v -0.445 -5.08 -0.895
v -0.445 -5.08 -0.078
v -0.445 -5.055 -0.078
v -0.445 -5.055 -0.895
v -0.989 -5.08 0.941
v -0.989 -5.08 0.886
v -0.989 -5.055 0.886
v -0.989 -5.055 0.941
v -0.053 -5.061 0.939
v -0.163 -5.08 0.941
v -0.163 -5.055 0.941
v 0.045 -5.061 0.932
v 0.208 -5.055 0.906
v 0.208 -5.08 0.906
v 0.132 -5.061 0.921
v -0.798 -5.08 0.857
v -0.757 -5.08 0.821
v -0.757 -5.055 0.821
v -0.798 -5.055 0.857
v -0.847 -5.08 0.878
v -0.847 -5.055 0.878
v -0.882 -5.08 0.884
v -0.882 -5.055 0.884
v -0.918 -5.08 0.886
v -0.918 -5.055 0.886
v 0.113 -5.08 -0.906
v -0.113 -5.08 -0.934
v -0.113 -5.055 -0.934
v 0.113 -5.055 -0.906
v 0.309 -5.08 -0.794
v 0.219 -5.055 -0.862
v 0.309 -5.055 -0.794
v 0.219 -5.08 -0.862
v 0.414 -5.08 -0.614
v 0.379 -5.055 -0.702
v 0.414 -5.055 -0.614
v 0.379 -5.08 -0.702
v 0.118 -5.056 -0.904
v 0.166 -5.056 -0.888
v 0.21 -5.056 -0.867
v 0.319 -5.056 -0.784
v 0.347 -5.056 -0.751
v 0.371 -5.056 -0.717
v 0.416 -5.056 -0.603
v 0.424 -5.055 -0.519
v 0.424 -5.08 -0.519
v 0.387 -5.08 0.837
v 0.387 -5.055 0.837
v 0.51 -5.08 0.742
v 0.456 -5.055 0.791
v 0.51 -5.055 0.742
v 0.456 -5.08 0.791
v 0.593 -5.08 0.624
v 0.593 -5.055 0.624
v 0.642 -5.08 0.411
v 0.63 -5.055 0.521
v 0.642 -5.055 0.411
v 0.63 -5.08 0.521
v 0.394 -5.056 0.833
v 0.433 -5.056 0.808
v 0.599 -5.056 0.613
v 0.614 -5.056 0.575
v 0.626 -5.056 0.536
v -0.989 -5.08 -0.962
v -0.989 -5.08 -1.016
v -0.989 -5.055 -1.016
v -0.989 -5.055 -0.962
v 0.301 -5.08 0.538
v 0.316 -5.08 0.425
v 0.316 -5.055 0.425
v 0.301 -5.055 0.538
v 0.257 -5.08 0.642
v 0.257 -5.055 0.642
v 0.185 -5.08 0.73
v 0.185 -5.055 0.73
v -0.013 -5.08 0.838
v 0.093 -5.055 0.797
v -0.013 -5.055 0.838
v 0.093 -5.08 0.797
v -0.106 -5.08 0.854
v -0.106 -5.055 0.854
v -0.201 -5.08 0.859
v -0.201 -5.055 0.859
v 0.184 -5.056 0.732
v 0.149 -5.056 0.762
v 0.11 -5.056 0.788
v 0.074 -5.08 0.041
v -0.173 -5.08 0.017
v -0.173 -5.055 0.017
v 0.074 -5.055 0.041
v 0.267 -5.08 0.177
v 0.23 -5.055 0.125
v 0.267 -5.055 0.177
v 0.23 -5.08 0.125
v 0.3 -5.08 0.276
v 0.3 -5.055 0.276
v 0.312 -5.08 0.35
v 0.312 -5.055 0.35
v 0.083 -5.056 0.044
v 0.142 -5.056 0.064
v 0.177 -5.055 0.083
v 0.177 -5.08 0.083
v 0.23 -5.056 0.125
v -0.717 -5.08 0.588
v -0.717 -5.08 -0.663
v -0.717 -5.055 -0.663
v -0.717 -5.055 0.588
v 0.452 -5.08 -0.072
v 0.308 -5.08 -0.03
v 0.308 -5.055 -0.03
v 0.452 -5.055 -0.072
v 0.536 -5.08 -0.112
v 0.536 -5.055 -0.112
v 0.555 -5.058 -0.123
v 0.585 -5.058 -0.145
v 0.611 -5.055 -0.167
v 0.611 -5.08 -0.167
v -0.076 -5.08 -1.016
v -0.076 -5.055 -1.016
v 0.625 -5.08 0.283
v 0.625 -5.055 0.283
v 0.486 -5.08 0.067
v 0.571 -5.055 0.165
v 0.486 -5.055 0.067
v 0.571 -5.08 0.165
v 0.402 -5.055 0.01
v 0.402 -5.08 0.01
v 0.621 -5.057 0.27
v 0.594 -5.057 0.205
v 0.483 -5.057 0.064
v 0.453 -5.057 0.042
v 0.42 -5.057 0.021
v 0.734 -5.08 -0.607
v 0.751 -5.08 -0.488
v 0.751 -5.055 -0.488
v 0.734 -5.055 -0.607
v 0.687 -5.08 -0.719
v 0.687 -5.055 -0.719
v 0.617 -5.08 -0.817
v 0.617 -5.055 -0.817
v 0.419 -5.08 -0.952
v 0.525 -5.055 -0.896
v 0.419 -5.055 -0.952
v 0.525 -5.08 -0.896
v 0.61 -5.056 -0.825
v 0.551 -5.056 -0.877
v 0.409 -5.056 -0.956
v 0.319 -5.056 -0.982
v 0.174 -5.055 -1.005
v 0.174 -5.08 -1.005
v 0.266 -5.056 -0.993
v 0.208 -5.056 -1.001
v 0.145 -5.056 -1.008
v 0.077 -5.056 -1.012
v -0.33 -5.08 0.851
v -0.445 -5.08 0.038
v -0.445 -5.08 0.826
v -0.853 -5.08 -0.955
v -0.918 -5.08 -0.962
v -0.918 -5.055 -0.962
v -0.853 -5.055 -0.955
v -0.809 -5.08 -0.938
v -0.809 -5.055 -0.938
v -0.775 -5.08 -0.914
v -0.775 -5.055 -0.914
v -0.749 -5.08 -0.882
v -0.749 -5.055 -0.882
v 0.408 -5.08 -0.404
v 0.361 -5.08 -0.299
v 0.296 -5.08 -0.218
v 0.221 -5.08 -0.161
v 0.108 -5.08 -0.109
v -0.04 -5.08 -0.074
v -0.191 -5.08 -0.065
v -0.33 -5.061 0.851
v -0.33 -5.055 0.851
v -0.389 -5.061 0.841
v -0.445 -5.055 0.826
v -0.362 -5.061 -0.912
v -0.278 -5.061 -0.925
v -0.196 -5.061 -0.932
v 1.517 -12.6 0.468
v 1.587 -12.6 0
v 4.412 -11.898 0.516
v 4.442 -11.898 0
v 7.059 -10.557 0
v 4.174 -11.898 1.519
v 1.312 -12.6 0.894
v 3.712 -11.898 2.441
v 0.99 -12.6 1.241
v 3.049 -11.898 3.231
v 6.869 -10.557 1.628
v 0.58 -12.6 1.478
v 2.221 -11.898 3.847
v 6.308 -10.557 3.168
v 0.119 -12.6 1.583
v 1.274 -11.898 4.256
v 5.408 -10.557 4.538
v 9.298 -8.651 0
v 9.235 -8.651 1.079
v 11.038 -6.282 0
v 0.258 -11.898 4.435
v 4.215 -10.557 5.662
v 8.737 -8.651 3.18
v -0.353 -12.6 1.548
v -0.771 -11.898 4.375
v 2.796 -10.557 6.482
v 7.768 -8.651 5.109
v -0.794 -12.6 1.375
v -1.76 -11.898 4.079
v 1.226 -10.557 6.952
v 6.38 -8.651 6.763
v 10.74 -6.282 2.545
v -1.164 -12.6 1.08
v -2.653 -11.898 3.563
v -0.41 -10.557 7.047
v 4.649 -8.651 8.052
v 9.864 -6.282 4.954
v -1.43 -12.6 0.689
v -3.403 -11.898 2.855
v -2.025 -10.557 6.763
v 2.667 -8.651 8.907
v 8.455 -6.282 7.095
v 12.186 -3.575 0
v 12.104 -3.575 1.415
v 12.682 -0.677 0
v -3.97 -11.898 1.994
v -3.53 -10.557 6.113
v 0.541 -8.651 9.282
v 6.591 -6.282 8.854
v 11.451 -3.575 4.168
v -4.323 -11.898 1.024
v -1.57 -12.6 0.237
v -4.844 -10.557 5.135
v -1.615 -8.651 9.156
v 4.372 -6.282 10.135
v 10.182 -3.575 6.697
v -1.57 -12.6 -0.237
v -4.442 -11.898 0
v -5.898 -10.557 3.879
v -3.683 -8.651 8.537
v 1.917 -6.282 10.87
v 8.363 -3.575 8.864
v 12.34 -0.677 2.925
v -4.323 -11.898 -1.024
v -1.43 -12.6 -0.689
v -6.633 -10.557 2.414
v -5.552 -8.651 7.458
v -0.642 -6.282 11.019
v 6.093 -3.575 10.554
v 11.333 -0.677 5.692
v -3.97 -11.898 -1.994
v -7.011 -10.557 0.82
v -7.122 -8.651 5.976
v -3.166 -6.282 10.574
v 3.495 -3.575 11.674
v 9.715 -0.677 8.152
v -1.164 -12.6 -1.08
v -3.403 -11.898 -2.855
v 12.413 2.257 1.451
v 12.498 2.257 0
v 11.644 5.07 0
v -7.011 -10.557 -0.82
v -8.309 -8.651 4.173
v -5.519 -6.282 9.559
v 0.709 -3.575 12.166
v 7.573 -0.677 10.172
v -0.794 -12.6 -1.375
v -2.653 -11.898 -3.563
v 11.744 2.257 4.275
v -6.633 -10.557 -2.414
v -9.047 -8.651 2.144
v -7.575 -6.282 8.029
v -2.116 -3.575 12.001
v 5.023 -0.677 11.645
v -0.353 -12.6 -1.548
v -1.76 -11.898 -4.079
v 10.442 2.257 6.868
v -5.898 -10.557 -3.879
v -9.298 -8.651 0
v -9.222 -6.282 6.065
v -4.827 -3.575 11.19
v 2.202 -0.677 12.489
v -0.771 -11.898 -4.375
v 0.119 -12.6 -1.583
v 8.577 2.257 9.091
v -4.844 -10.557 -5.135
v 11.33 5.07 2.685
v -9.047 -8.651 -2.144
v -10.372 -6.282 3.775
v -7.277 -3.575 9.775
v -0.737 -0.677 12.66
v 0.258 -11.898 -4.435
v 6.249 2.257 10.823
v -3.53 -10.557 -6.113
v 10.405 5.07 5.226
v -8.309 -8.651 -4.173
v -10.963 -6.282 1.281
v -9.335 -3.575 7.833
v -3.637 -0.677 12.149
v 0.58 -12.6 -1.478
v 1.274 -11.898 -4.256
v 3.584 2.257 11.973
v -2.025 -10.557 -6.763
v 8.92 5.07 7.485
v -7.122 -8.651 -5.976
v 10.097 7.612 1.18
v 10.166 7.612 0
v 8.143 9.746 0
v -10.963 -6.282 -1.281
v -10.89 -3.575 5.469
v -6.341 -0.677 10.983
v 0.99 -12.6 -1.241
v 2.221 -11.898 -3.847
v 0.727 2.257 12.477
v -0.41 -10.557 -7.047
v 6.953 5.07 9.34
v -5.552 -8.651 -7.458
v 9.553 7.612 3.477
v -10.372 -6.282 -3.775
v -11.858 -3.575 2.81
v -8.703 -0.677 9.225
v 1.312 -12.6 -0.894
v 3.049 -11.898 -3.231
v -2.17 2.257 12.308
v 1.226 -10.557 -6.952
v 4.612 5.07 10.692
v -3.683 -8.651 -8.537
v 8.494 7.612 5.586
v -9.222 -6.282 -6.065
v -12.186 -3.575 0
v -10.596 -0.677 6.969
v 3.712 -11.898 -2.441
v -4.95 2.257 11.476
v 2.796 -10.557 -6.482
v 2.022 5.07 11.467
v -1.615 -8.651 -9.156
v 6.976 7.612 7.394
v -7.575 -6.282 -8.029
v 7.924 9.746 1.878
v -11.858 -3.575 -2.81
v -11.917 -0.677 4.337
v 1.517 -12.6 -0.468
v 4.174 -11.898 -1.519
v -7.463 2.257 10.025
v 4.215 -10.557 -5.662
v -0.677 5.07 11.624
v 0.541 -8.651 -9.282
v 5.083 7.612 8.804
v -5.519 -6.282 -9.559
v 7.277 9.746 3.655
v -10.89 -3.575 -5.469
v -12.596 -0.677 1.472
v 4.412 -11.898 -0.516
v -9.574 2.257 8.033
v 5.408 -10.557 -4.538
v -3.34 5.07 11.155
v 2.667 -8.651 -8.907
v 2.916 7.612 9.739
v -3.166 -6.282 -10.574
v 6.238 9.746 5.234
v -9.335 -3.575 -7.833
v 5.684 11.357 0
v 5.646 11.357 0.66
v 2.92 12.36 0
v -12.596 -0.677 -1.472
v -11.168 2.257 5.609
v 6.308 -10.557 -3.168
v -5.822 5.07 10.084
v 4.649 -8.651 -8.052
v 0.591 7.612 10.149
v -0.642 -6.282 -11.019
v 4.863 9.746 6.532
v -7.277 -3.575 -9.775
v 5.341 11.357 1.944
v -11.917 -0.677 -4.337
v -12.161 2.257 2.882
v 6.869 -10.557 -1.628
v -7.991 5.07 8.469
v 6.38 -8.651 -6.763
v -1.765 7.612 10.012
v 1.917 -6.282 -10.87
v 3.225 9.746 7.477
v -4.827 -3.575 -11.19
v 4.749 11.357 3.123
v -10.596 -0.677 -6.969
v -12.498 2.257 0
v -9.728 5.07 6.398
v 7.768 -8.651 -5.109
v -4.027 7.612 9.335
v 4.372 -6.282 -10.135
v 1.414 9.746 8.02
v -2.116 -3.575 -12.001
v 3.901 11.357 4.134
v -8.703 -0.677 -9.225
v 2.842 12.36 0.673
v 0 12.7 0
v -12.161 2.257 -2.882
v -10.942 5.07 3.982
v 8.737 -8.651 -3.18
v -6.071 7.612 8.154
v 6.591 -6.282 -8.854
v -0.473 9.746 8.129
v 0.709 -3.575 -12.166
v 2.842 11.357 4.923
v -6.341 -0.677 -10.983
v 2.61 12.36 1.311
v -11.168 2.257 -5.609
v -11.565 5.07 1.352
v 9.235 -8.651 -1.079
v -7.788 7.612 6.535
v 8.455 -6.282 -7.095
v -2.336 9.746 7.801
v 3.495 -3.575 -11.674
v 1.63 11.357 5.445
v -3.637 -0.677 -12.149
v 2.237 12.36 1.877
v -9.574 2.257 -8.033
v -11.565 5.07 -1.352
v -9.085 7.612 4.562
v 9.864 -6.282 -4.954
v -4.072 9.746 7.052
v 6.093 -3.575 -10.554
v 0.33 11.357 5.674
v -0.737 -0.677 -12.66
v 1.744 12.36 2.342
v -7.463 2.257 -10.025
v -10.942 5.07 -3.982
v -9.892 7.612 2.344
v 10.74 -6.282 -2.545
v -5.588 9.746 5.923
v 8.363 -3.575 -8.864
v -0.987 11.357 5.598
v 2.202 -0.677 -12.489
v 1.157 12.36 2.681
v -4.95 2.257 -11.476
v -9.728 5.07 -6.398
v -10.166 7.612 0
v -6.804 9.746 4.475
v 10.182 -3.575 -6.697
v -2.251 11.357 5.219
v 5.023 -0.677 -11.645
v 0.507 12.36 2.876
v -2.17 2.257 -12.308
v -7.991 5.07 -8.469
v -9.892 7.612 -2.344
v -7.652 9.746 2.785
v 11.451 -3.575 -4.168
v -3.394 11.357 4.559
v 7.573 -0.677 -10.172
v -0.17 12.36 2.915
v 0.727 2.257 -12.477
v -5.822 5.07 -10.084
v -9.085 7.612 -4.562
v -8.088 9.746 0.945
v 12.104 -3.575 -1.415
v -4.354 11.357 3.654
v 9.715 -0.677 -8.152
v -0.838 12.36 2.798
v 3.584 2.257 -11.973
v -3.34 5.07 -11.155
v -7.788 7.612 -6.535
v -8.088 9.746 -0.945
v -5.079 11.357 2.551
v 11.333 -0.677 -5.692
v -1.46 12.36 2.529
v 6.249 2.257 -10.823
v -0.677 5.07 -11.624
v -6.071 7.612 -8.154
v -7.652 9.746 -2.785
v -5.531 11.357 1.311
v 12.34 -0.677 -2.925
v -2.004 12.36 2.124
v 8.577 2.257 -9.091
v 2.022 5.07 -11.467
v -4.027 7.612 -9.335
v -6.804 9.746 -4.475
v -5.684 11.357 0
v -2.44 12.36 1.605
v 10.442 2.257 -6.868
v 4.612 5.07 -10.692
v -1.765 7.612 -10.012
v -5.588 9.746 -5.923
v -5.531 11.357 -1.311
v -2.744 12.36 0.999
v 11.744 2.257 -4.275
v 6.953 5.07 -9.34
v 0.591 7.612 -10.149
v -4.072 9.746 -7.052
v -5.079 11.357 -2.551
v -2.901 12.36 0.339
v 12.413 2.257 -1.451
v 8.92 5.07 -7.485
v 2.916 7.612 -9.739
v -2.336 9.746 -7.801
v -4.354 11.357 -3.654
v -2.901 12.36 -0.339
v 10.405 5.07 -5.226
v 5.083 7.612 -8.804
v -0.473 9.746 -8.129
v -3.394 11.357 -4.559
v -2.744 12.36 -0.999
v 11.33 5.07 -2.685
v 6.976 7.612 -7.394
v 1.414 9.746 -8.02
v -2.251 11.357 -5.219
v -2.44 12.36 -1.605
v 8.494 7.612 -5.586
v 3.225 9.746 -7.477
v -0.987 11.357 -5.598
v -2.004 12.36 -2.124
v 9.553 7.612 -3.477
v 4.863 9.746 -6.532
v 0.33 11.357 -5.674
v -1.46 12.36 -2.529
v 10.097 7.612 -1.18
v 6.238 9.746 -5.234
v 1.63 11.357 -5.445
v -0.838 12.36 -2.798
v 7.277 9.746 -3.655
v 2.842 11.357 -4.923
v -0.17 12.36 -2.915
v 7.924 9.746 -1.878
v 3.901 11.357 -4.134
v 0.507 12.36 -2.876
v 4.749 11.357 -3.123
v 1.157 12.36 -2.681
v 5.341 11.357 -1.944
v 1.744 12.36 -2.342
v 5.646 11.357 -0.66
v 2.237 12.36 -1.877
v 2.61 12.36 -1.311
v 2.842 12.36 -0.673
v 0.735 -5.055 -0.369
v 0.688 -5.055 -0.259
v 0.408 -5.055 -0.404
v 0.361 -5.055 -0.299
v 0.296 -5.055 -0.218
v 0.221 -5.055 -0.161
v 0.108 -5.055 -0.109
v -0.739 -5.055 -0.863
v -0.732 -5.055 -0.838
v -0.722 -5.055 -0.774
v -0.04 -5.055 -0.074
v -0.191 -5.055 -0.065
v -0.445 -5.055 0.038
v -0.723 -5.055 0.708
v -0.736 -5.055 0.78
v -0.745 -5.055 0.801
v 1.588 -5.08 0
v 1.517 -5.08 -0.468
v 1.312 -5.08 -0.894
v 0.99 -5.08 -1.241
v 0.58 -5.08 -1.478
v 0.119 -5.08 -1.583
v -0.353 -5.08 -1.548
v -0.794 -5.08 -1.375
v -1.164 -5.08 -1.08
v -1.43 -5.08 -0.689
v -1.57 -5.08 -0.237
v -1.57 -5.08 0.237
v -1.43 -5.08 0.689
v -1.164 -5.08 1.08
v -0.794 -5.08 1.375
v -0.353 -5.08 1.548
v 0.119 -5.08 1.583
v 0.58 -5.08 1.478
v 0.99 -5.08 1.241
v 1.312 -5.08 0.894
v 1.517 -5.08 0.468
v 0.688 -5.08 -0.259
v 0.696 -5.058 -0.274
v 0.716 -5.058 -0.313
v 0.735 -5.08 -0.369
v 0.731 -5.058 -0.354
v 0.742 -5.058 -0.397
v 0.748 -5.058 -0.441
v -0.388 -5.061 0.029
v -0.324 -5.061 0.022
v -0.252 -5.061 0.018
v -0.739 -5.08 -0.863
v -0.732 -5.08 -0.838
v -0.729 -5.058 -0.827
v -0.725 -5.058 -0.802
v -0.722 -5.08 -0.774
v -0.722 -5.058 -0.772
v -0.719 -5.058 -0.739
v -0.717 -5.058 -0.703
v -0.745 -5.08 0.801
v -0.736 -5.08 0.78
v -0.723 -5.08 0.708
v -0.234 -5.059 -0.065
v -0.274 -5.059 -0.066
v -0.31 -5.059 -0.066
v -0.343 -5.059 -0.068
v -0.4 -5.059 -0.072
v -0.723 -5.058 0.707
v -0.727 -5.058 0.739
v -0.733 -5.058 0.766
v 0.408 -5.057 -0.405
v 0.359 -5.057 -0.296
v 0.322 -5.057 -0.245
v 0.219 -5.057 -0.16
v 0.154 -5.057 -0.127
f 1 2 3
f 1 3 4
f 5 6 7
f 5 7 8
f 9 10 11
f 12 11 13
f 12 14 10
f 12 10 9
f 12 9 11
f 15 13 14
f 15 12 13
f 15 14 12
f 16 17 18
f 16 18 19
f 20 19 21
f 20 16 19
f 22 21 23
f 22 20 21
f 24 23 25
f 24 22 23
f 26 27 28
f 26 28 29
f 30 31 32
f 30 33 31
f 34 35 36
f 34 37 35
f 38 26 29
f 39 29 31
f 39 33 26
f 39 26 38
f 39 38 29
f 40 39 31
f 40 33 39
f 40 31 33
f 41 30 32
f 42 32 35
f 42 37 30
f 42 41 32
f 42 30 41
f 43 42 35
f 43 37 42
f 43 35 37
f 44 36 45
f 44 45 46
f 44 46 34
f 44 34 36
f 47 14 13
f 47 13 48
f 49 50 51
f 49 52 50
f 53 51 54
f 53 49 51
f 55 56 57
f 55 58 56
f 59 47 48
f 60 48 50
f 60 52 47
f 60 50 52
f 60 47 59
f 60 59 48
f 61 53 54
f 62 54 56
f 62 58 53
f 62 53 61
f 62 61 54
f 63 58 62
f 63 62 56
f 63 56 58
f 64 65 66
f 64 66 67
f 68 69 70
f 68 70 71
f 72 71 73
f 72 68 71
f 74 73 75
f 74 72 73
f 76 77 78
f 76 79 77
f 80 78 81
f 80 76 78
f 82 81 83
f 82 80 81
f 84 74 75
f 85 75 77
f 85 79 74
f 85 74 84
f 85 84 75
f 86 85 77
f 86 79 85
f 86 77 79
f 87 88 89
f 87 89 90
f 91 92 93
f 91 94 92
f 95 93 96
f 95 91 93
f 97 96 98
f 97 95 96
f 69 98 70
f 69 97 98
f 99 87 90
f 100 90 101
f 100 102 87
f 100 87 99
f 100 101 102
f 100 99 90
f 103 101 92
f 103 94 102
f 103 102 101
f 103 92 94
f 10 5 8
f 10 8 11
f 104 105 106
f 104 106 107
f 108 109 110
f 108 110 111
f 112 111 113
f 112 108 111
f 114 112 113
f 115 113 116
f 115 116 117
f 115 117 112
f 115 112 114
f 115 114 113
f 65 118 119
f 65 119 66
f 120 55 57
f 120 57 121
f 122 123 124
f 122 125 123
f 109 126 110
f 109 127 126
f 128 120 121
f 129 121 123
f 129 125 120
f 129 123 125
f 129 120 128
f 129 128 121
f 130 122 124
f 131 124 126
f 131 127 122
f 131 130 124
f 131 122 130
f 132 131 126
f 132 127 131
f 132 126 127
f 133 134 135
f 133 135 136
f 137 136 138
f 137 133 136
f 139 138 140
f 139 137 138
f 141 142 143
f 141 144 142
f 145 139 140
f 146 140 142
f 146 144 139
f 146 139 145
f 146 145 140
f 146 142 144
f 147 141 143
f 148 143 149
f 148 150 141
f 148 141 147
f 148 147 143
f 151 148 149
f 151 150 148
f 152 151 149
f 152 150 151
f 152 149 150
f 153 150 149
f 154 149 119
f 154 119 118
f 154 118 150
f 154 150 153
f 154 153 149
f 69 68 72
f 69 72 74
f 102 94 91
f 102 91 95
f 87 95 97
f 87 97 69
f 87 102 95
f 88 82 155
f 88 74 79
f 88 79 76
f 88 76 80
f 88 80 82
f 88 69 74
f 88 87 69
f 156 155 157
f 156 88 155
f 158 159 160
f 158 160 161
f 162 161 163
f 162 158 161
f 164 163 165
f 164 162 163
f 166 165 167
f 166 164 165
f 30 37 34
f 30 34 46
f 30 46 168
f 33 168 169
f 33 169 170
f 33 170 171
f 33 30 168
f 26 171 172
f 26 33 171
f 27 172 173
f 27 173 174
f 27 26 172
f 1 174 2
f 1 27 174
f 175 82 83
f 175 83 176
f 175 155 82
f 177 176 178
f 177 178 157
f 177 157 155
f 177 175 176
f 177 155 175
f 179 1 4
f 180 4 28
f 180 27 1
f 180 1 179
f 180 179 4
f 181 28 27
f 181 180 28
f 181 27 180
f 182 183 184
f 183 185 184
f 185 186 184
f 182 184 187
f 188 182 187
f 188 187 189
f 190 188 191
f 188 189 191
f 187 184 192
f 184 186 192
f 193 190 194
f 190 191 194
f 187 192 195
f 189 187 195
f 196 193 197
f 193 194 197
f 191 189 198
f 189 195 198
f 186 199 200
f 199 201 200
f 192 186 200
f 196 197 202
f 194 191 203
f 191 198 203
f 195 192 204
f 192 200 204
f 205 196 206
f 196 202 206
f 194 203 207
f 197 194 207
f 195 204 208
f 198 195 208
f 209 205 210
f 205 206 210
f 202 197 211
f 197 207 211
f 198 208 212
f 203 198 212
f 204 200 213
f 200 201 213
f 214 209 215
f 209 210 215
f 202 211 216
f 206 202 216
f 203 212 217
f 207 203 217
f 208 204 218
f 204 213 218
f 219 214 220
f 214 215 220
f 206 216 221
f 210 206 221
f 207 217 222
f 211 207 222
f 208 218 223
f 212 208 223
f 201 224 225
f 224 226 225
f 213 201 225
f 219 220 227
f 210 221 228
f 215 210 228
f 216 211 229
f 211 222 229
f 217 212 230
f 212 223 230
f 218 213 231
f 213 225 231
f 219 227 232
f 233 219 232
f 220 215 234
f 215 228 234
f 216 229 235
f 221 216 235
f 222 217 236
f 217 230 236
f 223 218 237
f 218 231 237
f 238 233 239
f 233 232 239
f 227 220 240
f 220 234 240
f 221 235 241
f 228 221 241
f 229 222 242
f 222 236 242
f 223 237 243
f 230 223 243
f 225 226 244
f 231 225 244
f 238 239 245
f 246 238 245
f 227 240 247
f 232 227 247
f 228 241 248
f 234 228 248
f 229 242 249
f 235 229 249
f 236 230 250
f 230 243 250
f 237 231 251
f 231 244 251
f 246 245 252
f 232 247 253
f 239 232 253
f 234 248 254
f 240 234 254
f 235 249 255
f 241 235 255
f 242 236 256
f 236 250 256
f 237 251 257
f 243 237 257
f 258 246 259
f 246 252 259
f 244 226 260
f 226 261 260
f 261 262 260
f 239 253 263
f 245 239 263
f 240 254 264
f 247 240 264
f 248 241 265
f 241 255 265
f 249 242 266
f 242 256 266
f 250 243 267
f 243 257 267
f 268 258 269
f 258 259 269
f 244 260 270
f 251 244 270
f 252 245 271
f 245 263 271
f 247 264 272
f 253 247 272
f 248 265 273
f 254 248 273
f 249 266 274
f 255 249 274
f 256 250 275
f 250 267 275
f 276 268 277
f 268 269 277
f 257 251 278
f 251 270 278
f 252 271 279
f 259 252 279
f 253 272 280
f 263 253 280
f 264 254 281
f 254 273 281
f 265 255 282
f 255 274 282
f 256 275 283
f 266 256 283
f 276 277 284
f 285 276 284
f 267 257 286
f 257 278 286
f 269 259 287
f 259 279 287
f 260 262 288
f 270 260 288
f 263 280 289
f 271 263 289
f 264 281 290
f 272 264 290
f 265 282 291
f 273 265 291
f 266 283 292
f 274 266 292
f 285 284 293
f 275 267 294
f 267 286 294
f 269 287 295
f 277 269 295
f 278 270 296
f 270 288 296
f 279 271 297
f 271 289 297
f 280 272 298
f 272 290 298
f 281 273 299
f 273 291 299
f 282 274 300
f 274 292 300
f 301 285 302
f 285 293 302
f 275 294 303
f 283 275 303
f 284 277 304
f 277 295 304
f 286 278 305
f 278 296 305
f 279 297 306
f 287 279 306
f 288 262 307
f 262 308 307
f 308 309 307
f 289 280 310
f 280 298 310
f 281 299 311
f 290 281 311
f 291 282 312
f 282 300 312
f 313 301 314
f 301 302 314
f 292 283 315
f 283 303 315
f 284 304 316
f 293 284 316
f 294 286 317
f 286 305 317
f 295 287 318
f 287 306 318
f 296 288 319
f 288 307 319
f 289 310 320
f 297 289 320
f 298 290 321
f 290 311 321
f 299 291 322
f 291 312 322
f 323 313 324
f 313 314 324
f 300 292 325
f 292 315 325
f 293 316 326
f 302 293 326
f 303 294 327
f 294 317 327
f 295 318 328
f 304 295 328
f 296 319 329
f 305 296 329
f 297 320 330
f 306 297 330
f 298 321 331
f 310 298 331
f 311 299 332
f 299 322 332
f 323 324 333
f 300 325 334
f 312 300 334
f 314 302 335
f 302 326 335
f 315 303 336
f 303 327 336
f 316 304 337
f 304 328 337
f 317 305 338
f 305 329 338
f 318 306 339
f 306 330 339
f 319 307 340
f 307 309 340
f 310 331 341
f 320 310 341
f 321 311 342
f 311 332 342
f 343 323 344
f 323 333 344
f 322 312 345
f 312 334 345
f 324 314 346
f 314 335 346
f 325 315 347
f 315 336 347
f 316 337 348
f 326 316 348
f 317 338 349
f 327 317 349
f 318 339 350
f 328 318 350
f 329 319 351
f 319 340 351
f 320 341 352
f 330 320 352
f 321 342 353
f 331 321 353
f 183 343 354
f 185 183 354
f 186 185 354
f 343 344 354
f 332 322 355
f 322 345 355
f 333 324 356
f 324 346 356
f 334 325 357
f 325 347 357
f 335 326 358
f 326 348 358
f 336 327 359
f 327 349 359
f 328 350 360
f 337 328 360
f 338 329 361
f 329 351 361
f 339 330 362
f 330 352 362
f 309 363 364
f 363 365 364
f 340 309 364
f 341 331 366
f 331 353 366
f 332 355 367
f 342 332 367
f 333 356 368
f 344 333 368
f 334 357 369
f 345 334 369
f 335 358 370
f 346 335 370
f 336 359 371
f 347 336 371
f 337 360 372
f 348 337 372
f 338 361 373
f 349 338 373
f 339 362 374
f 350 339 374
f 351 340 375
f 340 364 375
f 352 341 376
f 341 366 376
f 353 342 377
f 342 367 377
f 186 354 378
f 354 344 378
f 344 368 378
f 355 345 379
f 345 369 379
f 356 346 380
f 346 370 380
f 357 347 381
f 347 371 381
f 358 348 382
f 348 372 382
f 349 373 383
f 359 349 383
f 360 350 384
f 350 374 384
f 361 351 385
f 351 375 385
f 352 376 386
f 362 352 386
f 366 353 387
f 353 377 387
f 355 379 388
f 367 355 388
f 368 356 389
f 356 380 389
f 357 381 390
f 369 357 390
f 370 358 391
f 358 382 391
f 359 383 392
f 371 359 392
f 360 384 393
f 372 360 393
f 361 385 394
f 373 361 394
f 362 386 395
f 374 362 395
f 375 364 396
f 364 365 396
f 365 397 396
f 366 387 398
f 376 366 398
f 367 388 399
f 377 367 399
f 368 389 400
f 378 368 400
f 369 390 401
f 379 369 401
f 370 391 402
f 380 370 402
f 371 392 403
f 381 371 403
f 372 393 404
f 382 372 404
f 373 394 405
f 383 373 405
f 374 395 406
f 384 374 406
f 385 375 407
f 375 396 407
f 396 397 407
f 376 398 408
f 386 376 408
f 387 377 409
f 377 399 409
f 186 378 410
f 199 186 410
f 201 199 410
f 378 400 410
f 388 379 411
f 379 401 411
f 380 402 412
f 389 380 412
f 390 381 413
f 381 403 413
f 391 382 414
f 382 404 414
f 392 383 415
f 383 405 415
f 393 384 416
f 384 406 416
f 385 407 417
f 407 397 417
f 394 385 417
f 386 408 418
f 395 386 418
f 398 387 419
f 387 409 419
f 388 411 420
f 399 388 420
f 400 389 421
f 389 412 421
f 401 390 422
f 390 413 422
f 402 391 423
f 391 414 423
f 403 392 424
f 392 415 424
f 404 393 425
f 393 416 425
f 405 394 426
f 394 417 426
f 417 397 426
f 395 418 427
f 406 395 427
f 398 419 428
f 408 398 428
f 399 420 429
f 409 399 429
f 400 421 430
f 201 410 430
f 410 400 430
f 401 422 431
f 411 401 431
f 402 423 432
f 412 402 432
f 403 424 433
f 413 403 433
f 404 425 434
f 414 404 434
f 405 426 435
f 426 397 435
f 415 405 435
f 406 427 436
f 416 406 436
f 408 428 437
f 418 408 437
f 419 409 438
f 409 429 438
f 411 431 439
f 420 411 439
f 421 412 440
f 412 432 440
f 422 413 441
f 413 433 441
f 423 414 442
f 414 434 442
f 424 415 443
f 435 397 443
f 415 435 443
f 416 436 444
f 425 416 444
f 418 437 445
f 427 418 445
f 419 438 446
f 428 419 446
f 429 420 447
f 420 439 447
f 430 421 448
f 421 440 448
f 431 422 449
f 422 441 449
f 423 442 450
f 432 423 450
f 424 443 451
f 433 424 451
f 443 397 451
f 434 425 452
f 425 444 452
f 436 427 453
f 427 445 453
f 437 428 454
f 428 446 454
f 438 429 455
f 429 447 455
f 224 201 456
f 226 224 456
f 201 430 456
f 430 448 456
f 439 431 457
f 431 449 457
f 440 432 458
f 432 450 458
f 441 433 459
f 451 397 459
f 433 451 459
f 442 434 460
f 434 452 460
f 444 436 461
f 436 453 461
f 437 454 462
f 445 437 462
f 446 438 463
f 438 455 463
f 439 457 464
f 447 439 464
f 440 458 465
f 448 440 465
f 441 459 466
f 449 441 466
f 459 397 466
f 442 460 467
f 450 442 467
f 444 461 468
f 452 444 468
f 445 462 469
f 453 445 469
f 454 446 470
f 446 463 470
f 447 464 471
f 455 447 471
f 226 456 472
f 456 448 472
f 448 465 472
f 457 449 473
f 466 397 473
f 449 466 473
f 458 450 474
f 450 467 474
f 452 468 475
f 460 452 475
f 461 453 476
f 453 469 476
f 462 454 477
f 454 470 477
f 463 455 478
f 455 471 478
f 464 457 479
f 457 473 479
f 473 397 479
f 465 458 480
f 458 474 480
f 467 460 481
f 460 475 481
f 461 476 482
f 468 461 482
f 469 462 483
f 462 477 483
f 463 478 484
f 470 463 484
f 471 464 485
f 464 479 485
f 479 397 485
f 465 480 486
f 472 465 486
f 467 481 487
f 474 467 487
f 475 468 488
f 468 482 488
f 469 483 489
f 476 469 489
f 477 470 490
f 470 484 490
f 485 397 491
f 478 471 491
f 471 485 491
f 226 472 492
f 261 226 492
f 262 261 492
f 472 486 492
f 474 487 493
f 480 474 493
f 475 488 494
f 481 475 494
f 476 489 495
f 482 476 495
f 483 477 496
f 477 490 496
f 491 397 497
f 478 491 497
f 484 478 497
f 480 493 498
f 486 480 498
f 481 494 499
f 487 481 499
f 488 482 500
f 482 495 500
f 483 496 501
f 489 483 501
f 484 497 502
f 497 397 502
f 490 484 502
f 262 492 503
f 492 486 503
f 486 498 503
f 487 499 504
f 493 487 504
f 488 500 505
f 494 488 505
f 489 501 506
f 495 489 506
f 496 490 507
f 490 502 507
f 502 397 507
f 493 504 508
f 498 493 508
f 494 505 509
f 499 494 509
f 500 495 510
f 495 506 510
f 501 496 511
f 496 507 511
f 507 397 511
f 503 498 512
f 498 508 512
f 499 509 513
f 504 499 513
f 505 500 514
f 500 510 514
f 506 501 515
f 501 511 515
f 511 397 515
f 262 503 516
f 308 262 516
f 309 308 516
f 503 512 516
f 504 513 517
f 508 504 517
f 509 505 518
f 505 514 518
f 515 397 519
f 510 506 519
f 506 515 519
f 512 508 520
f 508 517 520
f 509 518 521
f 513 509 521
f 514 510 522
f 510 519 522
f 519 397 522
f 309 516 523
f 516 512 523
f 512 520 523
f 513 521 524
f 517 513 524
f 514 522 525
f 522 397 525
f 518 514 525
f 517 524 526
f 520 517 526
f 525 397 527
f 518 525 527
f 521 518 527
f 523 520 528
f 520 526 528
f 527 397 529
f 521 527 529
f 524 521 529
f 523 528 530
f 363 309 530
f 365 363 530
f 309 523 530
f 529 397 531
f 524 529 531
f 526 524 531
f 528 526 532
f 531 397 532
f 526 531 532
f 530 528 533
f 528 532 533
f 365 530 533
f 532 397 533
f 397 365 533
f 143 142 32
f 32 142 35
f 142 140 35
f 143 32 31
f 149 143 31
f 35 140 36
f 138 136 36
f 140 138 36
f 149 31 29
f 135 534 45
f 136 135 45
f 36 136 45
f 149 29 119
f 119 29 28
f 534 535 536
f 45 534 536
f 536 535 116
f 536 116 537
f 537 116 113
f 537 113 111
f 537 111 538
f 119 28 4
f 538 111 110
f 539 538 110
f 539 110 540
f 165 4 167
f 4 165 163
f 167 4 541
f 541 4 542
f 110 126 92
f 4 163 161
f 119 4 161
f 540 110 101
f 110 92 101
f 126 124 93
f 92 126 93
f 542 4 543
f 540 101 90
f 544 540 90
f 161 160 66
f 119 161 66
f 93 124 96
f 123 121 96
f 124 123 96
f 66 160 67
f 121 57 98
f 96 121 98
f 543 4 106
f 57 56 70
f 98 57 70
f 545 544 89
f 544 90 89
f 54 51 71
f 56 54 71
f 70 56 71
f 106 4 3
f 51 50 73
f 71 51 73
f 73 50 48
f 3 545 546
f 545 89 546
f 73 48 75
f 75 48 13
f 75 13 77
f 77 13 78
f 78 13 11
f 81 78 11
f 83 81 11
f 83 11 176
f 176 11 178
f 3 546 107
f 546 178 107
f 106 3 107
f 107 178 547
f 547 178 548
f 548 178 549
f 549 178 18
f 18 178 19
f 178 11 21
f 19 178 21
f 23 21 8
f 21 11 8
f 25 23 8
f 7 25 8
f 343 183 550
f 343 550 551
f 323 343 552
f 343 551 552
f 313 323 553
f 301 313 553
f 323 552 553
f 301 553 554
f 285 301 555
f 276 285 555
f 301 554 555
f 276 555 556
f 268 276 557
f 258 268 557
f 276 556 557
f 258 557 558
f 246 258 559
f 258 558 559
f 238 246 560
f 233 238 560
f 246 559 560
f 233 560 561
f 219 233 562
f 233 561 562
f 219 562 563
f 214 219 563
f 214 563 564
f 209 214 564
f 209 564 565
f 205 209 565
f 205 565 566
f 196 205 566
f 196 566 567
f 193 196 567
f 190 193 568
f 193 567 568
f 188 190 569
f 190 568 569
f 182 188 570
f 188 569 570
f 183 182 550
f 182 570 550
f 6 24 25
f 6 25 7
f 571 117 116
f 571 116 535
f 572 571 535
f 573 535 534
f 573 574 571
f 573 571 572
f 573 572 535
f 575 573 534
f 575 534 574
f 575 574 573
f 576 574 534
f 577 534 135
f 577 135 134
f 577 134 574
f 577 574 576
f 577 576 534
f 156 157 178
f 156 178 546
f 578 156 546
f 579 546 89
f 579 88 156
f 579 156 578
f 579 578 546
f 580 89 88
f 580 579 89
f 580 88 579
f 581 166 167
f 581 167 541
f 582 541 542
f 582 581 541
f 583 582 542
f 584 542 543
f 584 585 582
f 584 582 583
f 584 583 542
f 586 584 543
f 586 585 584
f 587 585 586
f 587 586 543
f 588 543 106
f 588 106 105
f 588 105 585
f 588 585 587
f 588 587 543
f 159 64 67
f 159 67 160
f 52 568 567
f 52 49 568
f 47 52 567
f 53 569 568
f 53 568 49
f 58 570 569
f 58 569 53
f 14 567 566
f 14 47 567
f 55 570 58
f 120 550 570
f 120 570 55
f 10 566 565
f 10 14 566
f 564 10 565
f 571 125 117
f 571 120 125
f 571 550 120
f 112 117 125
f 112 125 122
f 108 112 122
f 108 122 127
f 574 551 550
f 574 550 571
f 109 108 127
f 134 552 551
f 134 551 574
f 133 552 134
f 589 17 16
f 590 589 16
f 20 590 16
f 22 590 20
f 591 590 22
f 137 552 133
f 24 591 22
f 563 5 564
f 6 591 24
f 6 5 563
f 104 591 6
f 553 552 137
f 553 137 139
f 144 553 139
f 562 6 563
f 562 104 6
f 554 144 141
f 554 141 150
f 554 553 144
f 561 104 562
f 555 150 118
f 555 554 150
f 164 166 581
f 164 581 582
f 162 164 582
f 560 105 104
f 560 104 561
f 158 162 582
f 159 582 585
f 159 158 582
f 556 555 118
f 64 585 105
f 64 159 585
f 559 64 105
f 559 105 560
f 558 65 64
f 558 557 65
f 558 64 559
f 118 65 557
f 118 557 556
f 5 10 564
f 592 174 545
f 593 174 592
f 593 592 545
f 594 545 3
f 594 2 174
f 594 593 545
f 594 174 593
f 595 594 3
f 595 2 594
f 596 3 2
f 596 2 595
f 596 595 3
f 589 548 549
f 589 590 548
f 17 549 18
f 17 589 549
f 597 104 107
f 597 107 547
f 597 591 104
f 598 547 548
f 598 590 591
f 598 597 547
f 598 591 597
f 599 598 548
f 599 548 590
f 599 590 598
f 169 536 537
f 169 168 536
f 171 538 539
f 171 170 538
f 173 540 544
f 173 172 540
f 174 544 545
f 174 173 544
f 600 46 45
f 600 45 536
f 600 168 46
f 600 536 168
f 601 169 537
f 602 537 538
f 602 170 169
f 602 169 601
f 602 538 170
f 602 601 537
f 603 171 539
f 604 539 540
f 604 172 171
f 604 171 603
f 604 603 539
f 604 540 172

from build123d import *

# Parameters (mm, degrees)
SKETCH7_W          = 1.5875
SKETCH7_H          = 7.62
CUT_EXTRUDE1_DEPTH = 0.0254


with BuildPart() as part:
    # Sketch1 → Complete_Ball (revolve)
    with BuildSketch(Plane.XY):
        with BuildLine():
            Line((0, 12.7), (0, -12.7))
            ThreePointArc((0, -12.7), (12.7, 0), (0, 12.7))
        make_face()
    revolve(axis=Axis((0, 13.965019531, 0), (0, -1, 0)))

    # Sketch7 → Ball_w_concentric_hole (revolve, cut)
    with BuildSketch(Plane.XY):
        with Locations((0.79375, -8.89)):
            Rectangle(SKETCH7_W, SKETCH7_H)
    revolve(axis=Axis((0, -6.726898043, 0), (0, 1, 0)), mode=Mode.SUBTRACT)

    # Sketch9 → Cut-Extrude1 (cut)
    with BuildSketch(Plane.XZ.offset(5.08)):
        with BuildLine():
            add(Edge.make_bspline(
                [(0.308076994, -0.030373732), (0.324538713, -0.034024291), (0.356530602, -0.041118827), (0.402477662, -0.054290859), (0.445054282, -0.069285046), (0.484732885, -0.085294373), (0.521280558, -0.103036208), (0.554555606, -0.122564651), (0.584482781, -0.143830699), (0.602480105, -0.159466562), (0.611281283, -0.167112921)],
                knots=[0, 0, 0, 0, 1.202298385, 2.336560135, 3.406084711, 4.420247637, 5.386399354, 6.300522109, 7.168909389, 8, 8, 8, 8], degree=3))
            add(Edge.make_bspline(
                [(0.611281283, -0.167112921), (0.622417749, -0.178075677), (0.644400951, -0.199715976), (0.67281694, -0.235522748), (0.696753104, -0.273154409), (0.716536823, -0.312521351), (0.731766785, -0.353857034), (0.742939599, -0.39692676), (0.749363419, -0.441811935), (0.750162969, -0.472278831), (0.750568408, -0.487728101)],
                knots=[0, 0, 0, 0, 1.040892545, 2.054704896, 3.038886078, 4.009403739, 4.985637774, 5.96968326, 6.970459233, 8, 8, 8, 8], degree=3))
            add(Edge.make_bspline(
                [(0.750568408, -0.487728101), (0.749580677, -0.511480749), (0.747596123, -0.559204719), (0.728910303, -0.629570582), (0.700367842, -0.698612498), (0.660350876, -0.764646818), (0.611443791, -0.826373993), (0.551760396, -0.878883273), (0.484387528, -0.923101532), (0.421448289, -0.952346751), (0.365407997, -0.970620061), (0.317719104, -0.98275638), (0.264926091, -0.993624769), (0.20667372, -1.001054176), (0.143434911, -1.008194794), (0.07484539, -1.01250787), (0.001081213, -1.015688606), (-0.049903845, -1.015893946), (-0.076236566, -1.016)],
                knots=[0, 0, 0, 0, 1.028770293, 2.067011775, 3.138033473, 4.261901228, 5.406207792, 6.541562624, 7.694800496, 8.892876887, 9.539626609, 10.250184141, 11.027081459, 11.876550478, 12.796927842, 13.788050093, 14.85757392, 16, 16, 16, 16], degree=3))
            Line((-0.076236566, -1.016), (-0.988822024, -1.016))
            Line((-0.988822024, -1.016), (-0.988822024, -0.961644049))
            Line((-0.988822024, -0.961644049), (-0.917904495, -0.961644049))
            add(Edge.make_bspline(
                [(-0.917904495, -0.961644049), (-0.908402664, -0.961432941), (-0.890024832, -0.961024629), (-0.863622385, -0.956950597), (-0.839065748, -0.951375967), (-0.816950335, -0.942204208), (-0.796626646, -0.931084721), (-0.778261022, -0.917590019), (-0.762272466, -0.901062238), (-0.753405479, -0.88858522), (-0.74889146, -0.882233402)],
                knots=[0, 0, 0, 0, 1.166786496, 2.256723755, 3.277842578, 4.25348796, 5.187934752, 6.120436128, 7.043148905, 8, 8, 8, 8], degree=3))
            add(Edge.make_bspline(
                [(-0.74889146, -0.882233402), (-0.746190352, -0.877347431), (-0.740363736, -0.866807802), (-0.734346678, -0.84805755), (-0.728780995, -0.826107168), (-0.724762233, -0.800356427), (-0.721378545, -0.77103352), (-0.718963551, -0.738021693), (-0.71713277, -0.701491854), (-0.717073307, -0.675994887), (-0.717042269, -0.662686318)],
                knots=[0, 0, 0, 0, 0.597321695, 1.288494999, 2.101981578, 3.025155317, 4.079375286, 5.266669335, 6.573292293, 8, 8, 8, 8], degree=3))
            Line((-0.717042269, -0.662686318), (-0.717042269, 0.587500555))
            add(Edge.make_bspline(
                [(-0.717042269, 0.587500555), (-0.717020857, 0.602227129), (-0.716980065, 0.63028246), (-0.719451119, 0.670192763), (-0.721936908, 0.705972397), (-0.726817478, 0.737387607), (-0.732121451, 0.764688921), (-0.738568219, 0.7877891), (-0.747095316, 0.806473529), (-0.754139821, 0.816751719), (-0.757384577, 0.821485937)],
                knots=[0, 0, 0, 0, 1.467983741, 2.79662948, 3.986363477, 5.042318655, 5.964098798, 6.759038926, 7.428403245, 8, 8, 8, 8], degree=3))
            add(Edge.make_bspline(
                [(-0.757384577, 0.821485937), (-0.766968382, 0.831548203), (-0.786306937, 0.851852213), (-0.824785442, 0.872201997), (-0.869332734, 0.884203522), (-0.901116145, 0.885678948), (-0.917904495, 0.886458285)],
                knots=[0, 0, 0, 0, 0.927123666, 1.870784184, 2.875324672, 4, 4, 4, 4], degree=3))
            Line((-0.917904495, 0.886458285), (-0.988822024, 0.886458285))
            Line((-0.988822024, 0.886458285), (-0.988822024, 0.940814236))
            Line((-0.988822024, 0.940814236), (-0.162866363, 0.940814236))
            add(Edge.make_bspline(
                [(-0.162866363, 0.940814236), (-0.126188539, 0.940513422), (-0.056725795, 0.939943722), (0.041752121, 0.932910915), (0.129010541, 0.922793404), (0.182730464, 0.91105738), (0.207858209, 0.905567799)],
                knots=[0, 0, 0, 0, 1.179035714, 2.232931189, 3.173445281, 4, 4, 4, 4], degree=3))
            add(Edge.make_bspline(
                [(0.207858209, 0.905567799), (0.225058291, 0.900995857), (0.258662627, 0.892063511), (0.306862604, 0.874872481), (0.35200904, 0.855362596), (0.394161004, 0.833417302), (0.432870067, 0.808543943), (0.468965178, 0.781808256), (0.501653259, 0.752055301), (0.530912052, 0.719772753), (0.556715696, 0.685606681), (0.580062927, 0.650467371), (0.598866319, 0.613375247), (0.614986078, 0.57548153), (0.626598012, 0.536066061), (0.635806285, 0.495707281), (0.640869134, 0.453863359), (0.641524814, 0.425577459), (0.641856506, 0.41126837)],
                knots=[0, 0, 0, 0, 1.197163213, 2.33893505, 3.43955965, 4.504702612, 5.532566955, 6.532694419, 7.523891994, 8.501634608, 9.459882266, 10.403051993, 11.336018195, 12.25408421, 13.170072591, 14.09679423, 15.037218469, 16, 16, 16, 16], degree=3))
            add(Edge.make_bspline(
                [(0.641856506, 0.41126837), (0.640988305, 0.386966428), (0.639277347, 0.339074706), (0.622358228, 0.269582217), (0.595666689, 0.204017494), (0.565112824, 0.152992911), (0.535110113, 0.115449663), (0.510556404, 0.08830852), (0.482805357, 0.063927102), (0.452810586, 0.041062695), (0.420086682, 0.020541755), (0.38522035, 0.001209477), (0.347651311, -0.015759261), (0.321445222, -0.025436955), (0.308076994, -0.030373732)],
                knots=[0, 0, 0, 0, 1.471082931, 2.899056279, 4.307818116, 5.751614296, 6.484736272, 7.219614112, 7.967209451, 8.720692231, 9.503935749, 10.306636219, 11.136182697, 12, 12, 12, 12], degree=3))
        make_face()
        with BuildLine():
            add(Edge.make_bspline(
                [(-0.445262514, 0.037995862), (-0.426327321, 0.034656251), (-0.386080053, 0.027557818), (-0.321529386, 0.021144961), (-0.249825238, 0.017428628), (-0.199675095, 0.016991416), (-0.173482759, 0.016763069)],
                knots=[0, 0, 0, 0, 0.844887106, 1.795830451, 2.848809897, 4, 4, 4, 4], degree=3))
            add(Edge.make_bspline(
                [(-0.173482759, 0.016763069), (-0.156495387, 0.016960654), (-0.123639547, 0.017342808), (-0.076026849, 0.019288173), (-0.031719973, 0.023285242), (0.00930446, 0.028009349), (0.047066576, 0.035115731), (0.08167708, 0.042721005), (0.112945821, 0.052723303), (0.149614447, 0.066940798), (0.19007552, 0.088916151), (0.23035913, 0.122823227), (0.261457989, 0.163456789), (0.282889969, 0.210155805), (0.296731598, 0.260777518), (0.308199203, 0.31345399), (0.314500353, 0.368508228), (0.315309667, 0.405874992), (0.3157208, 0.424857357)],
                knots=[0, 0, 0, 0, 1.091830023, 2.111744693, 3.061402081, 3.95056914, 4.764258185, 5.530001833, 6.226288629, 6.871621508, 8.056545267, 9.166642, 10.231067328, 11.317616446, 12.446050905, 13.598649409, 14.780110772, 16, 16, 16, 16], degree=3))
            add(Edge.make_bspline(
                [(0.3157208, 0.424857357), (0.315274183, 0.439594324), (0.314394441, 0.468623136), (0.308579089, 0.511424009), (0.297616446, 0.552413229), (0.283341565, 0.591889551), (0.264856225, 0.629856323), (0.24190265, 0.6657694), (0.214734501, 0.700054926), (0.1840394, 0.732629931), (0.149194905, 0.76249929), (0.110236379, 0.788477557), (0.067684677, 0.810609885), (0.021216663, 0.82849277), (-0.028831328, 0.842453754), (-0.082873755, 0.85205292), (-0.140507573, 0.858047973), (-0.180261974, 0.858862407), (-0.200660735, 0.85928031)],
                knots=[0, 0, 0, 0, 0.932104058, 1.836054539, 2.724128921, 3.610577454, 4.48739039, 5.388899496, 6.300486582, 7.250348221, 8.215526472, 9.196272454, 10.205292906, 11.242666987, 12.339557976, 13.48617357, 14.710106481, 16, 16, 16, 16], degree=3))
            add(Edge.make_bspline(
                [(-0.200660735, 0.85928031), (-0.222755045, 0.858845399), (-0.265893392, 0.857996252), (-0.32895856, 0.852174222), (-0.388604371, 0.84167089), (-0.426645356, 0.831254772), (-0.445262514, 0.826157152)],
                knots=[0, 0, 0, 0, 1.070391011, 2.089899941, 3.065202048, 4, 4, 4, 4], degree=3))
            Line((-0.445262514, 0.826157152), (-0.445262514, 0.037995862))
        make_face(mode=Mode.SUBTRACT)
        with BuildLine():
            add(Edge.make_bspline(
                [(-0.445262514, -0.894973078), (-0.417443506, -0.901131169), (-0.362095565, -0.913383138), (-0.278646345, -0.925338098), (-0.195705669, -0.932903229), (-0.140658937, -0.933945707), (-0.113181626, -0.934466073)],
                knots=[0, 0, 0, 0, 1.019899824, 2.029164851, 3.016231376, 4, 4, 4, 4], degree=3))
            add(Edge.make_bspline(
                [(-0.113181626, -0.934466073), (-0.091929976, -0.934252226), (-0.050751607, -0.933837863), (0.009069282, -0.927437289), (0.065096664, -0.918561989), (0.117145516, -0.905172654), (0.165579696, -0.88891324), (0.209737927, -0.867987195), (0.25019028, -0.843565692), (0.286693969, -0.815673306), (0.318630006, -0.784579101), (0.347205512, -0.752213582), (0.370951573, -0.71762533), (0.390803655, -0.681461485), (0.405596026, -0.643095371), (0.41676876, -0.603336191), (0.423256869, -0.561547228), (0.424035612, -0.533188423), (0.424432702, -0.518727979)],
                knots=[0, 0, 0, 0, 1.335369974, 2.58748639, 3.778398001, 4.898614871, 5.962444548, 6.985554789, 7.963871145, 8.928614683, 9.866425566, 10.762210136, 11.638554271, 12.498661649, 13.349744001, 14.217688406, 15.091181162, 16, 16, 16, 16], degree=3))
            add(Edge.make_bspline(
                [(0.424432702, -0.518727979), (0.4235265, -0.499567493), (0.421710444, -0.461169303), (0.409685349, -0.404035632), (0.388218739, -0.348651871), (0.359964971, -0.294377764), (0.322780244, -0.243092717), (0.275077564, -0.197879287), (0.218738662, -0.157870999), (0.15288954, -0.124748012), (0.078754411, -0.097458162), (-0.003925713, -0.078132811), (-0.094744496, -0.066773569), (-0.158019387, -0.065455602), (-0.19089365, -0.064770857)],
                knots=[0, 0, 0, 0, 0.80426076, 1.611762754, 2.437163379, 3.29025987, 4.174362993, 5.081949637, 6.03643416, 7.064744133, 8.166225842, 9.344998398, 10.620602567, 12, 12, 12, 12], degree=3))
            add(Edge.make_bspline(
                [(-0.19089365, -0.064770857), (-0.205191428, -0.064684482), (-0.232799059, -0.0645177), (-0.272567725, -0.065669626), (-0.309100885, -0.066295208), (-0.351293058, -0.06804369), (-0.396516564, -0.070242075), (-0.430284502, -0.075571351), (-0.445262514, -0.077935189)],
                knots=[0, 0, 0, 0, 1.009225997, 1.948718216, 2.808291512, 3.588270035, 4.930259813, 6, 6, 6, 6], degree=3))
            Line((-0.445262514, -0.077935189), (-0.445262514, -0.894973078))
        make_face(mode=Mode.SUBTRACT)
    extrude(amount=-CUT_EXTRUDE1_DEPTH, mode=Mode.SUBTRACT)


solid = part.part
